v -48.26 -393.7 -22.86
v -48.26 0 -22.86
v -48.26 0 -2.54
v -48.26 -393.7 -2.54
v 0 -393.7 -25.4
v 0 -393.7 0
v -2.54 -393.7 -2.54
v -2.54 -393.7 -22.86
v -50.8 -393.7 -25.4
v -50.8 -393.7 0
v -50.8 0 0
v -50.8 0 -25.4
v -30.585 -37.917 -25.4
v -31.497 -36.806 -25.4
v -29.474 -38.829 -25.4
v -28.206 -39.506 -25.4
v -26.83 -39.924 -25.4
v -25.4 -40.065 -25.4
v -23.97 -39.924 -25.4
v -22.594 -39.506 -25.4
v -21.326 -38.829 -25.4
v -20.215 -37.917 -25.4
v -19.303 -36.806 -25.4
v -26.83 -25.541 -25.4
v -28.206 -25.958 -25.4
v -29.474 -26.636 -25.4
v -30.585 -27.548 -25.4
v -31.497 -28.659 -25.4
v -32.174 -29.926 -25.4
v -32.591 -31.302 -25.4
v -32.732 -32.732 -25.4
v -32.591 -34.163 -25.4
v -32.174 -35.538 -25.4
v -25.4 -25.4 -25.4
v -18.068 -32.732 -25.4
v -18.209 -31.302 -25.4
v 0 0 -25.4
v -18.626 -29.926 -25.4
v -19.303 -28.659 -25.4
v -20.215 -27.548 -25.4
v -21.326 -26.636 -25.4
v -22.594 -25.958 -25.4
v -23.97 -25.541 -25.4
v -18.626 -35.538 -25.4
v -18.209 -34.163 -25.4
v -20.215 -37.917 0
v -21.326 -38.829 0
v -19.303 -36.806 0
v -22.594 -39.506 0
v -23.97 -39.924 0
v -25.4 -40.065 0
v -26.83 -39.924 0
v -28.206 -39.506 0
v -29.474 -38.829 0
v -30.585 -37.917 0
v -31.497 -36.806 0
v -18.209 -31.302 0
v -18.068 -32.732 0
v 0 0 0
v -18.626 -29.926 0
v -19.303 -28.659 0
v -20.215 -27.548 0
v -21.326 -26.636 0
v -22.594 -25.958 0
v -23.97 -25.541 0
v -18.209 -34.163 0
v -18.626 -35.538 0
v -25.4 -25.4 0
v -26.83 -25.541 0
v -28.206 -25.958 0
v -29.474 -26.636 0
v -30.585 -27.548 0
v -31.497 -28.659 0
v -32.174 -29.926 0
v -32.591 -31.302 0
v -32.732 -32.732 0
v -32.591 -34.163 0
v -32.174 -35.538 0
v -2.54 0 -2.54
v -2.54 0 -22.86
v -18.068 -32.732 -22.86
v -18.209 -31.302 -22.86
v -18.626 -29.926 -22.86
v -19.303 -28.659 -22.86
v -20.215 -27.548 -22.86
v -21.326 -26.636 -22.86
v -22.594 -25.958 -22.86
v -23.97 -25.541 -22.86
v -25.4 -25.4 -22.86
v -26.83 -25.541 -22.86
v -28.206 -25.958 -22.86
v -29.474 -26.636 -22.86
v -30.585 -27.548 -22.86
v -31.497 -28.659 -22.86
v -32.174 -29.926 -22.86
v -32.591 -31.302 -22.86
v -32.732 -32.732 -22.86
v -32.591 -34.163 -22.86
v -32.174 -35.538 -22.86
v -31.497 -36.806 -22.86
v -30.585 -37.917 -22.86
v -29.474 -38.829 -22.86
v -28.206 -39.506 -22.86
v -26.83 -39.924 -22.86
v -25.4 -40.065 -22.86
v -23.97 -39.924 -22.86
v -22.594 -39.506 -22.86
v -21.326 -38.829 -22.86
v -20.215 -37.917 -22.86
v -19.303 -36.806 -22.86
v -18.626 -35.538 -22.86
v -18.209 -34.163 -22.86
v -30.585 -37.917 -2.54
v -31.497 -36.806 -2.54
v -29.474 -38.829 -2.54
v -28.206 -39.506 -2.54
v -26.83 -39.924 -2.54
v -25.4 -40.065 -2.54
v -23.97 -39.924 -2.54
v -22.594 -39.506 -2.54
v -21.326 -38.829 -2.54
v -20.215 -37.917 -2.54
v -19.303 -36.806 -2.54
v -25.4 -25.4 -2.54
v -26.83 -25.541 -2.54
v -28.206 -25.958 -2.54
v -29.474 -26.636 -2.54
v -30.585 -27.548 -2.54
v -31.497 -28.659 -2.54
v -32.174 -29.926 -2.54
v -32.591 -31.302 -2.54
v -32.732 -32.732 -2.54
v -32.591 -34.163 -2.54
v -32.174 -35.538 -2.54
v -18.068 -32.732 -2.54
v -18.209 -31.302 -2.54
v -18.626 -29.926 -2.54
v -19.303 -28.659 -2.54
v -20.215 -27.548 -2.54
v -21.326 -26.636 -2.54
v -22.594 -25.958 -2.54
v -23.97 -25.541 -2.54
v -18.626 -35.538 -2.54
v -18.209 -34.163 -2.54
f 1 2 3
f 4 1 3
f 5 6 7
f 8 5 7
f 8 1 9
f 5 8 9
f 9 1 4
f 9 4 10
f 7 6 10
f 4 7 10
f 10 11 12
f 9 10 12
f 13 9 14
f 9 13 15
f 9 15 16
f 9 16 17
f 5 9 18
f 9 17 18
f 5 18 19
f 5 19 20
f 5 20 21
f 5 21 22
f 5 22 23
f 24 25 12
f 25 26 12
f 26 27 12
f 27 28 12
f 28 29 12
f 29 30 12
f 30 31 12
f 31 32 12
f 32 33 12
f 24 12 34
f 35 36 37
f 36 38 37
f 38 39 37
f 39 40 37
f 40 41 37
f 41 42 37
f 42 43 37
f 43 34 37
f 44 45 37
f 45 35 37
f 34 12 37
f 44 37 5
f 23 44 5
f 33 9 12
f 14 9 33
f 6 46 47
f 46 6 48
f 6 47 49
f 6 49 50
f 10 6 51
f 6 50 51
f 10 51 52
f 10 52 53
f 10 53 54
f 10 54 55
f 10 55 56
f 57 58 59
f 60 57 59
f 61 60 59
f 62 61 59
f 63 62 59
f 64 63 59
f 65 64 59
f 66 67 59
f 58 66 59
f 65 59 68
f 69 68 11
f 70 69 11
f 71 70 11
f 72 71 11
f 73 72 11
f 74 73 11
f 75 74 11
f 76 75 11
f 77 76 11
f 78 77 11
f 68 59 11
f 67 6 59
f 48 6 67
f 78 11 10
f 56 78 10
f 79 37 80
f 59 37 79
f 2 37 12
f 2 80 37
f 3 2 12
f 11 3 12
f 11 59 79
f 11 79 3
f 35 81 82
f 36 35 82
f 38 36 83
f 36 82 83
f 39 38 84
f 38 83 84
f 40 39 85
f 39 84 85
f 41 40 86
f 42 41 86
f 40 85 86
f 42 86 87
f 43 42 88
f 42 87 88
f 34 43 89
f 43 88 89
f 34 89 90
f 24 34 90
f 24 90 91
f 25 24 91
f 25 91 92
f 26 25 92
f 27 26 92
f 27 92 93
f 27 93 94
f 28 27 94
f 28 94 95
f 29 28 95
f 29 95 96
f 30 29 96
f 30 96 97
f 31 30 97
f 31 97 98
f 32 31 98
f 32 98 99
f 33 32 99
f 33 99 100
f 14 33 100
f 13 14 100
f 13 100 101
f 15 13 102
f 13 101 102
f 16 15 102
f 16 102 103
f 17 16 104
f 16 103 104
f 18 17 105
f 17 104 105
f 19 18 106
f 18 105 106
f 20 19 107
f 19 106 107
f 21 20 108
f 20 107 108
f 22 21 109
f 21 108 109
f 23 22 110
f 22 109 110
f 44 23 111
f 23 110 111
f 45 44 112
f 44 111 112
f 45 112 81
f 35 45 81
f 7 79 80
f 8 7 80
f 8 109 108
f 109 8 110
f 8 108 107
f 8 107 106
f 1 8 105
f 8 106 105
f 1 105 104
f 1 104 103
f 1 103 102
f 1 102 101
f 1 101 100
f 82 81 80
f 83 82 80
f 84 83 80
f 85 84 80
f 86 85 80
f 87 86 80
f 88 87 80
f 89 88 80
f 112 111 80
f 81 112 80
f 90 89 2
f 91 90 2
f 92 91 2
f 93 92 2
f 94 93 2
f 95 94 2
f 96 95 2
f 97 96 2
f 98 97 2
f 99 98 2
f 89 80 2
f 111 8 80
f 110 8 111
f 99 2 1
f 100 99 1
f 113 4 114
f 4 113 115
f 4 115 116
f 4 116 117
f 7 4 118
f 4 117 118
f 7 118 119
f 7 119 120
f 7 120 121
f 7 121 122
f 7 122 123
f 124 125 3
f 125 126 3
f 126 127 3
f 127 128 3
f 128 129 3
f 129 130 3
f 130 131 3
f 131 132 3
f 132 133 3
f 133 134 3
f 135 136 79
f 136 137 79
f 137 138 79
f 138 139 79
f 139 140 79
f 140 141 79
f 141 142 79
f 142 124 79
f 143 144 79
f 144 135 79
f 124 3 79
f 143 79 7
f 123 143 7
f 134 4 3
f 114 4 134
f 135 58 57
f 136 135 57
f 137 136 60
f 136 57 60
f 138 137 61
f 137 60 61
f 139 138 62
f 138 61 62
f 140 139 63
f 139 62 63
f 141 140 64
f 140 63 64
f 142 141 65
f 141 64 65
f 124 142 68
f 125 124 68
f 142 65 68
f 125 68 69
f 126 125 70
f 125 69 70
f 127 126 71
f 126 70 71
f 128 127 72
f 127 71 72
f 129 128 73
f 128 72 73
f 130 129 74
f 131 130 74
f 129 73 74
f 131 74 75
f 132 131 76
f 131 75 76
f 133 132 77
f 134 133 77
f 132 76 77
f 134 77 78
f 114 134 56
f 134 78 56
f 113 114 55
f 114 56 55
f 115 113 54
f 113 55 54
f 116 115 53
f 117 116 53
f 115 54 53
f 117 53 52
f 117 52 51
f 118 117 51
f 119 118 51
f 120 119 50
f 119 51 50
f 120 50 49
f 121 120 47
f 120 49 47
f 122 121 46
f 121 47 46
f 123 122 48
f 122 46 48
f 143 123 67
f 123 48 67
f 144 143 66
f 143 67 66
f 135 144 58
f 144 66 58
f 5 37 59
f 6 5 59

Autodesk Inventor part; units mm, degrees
ref_plane "YZ Plane" through (0, 0, 0) normal (1, 0, 0) x (0, 1, 0)
ref_plane "XZ Plane" through (0, 0, 0) normal (0, 1, 0) x (-1, 0, 0)
ref_plane "XY Plane" through (0, 0, 0) normal (0, 0, 1) x (1, 0, 0)
sketch "Sketch1" plane through (0, 0, 0) normal (0, 1, 0) x (-1, 0, 0)
  line L0 (0, 0) -> (50.8, 0)
  line L1 (50.8, 0) -> (50.8, -25.4)
  line L2 (50.8, -25.4) -> (0, -25.4)
  line L3 (0, -25.4) -> (0, 0)
  line L4 (2.54, -22.86) -> (48.26, -22.86)
  line L5 (48.26, -22.86) -> (48.26, -2.54)
  line L6 (48.26, -2.54) -> (2.54, -2.54)
  line L7 (2.54, -2.54) -> (2.54, -22.86)
  dimension "d0" = 50.8
  dimension "d1" = 25.4
  dimension "d2" = 2.54
extrude "Extrusion1" add sketch "Sketch1" against normal blind 393.7
sketch "Sketch2" plane through (-50.8, 0, 0) normal (0, 0, 1) x (1, 0, 0)
  circle A0 centre (25.4, -32.7323) radius 7.3323 projected
  line L0 (50.8, -279.4) -> (0, -279.4) projected
  line L1 (50.8, -279.4) -> (50.8, 0) projected
  line L2 (0, 0) -> (50.8, 0) projected
  line L3 (0, -279.4) -> (0, 0) projected
  circle A1 centre (25.4, -32.7323) radius 7.3323
extrude "Extrusion2" cut sketch "Sketch2" against normal through all contours A0
properties part number "Aluminum channel pivot mount"
